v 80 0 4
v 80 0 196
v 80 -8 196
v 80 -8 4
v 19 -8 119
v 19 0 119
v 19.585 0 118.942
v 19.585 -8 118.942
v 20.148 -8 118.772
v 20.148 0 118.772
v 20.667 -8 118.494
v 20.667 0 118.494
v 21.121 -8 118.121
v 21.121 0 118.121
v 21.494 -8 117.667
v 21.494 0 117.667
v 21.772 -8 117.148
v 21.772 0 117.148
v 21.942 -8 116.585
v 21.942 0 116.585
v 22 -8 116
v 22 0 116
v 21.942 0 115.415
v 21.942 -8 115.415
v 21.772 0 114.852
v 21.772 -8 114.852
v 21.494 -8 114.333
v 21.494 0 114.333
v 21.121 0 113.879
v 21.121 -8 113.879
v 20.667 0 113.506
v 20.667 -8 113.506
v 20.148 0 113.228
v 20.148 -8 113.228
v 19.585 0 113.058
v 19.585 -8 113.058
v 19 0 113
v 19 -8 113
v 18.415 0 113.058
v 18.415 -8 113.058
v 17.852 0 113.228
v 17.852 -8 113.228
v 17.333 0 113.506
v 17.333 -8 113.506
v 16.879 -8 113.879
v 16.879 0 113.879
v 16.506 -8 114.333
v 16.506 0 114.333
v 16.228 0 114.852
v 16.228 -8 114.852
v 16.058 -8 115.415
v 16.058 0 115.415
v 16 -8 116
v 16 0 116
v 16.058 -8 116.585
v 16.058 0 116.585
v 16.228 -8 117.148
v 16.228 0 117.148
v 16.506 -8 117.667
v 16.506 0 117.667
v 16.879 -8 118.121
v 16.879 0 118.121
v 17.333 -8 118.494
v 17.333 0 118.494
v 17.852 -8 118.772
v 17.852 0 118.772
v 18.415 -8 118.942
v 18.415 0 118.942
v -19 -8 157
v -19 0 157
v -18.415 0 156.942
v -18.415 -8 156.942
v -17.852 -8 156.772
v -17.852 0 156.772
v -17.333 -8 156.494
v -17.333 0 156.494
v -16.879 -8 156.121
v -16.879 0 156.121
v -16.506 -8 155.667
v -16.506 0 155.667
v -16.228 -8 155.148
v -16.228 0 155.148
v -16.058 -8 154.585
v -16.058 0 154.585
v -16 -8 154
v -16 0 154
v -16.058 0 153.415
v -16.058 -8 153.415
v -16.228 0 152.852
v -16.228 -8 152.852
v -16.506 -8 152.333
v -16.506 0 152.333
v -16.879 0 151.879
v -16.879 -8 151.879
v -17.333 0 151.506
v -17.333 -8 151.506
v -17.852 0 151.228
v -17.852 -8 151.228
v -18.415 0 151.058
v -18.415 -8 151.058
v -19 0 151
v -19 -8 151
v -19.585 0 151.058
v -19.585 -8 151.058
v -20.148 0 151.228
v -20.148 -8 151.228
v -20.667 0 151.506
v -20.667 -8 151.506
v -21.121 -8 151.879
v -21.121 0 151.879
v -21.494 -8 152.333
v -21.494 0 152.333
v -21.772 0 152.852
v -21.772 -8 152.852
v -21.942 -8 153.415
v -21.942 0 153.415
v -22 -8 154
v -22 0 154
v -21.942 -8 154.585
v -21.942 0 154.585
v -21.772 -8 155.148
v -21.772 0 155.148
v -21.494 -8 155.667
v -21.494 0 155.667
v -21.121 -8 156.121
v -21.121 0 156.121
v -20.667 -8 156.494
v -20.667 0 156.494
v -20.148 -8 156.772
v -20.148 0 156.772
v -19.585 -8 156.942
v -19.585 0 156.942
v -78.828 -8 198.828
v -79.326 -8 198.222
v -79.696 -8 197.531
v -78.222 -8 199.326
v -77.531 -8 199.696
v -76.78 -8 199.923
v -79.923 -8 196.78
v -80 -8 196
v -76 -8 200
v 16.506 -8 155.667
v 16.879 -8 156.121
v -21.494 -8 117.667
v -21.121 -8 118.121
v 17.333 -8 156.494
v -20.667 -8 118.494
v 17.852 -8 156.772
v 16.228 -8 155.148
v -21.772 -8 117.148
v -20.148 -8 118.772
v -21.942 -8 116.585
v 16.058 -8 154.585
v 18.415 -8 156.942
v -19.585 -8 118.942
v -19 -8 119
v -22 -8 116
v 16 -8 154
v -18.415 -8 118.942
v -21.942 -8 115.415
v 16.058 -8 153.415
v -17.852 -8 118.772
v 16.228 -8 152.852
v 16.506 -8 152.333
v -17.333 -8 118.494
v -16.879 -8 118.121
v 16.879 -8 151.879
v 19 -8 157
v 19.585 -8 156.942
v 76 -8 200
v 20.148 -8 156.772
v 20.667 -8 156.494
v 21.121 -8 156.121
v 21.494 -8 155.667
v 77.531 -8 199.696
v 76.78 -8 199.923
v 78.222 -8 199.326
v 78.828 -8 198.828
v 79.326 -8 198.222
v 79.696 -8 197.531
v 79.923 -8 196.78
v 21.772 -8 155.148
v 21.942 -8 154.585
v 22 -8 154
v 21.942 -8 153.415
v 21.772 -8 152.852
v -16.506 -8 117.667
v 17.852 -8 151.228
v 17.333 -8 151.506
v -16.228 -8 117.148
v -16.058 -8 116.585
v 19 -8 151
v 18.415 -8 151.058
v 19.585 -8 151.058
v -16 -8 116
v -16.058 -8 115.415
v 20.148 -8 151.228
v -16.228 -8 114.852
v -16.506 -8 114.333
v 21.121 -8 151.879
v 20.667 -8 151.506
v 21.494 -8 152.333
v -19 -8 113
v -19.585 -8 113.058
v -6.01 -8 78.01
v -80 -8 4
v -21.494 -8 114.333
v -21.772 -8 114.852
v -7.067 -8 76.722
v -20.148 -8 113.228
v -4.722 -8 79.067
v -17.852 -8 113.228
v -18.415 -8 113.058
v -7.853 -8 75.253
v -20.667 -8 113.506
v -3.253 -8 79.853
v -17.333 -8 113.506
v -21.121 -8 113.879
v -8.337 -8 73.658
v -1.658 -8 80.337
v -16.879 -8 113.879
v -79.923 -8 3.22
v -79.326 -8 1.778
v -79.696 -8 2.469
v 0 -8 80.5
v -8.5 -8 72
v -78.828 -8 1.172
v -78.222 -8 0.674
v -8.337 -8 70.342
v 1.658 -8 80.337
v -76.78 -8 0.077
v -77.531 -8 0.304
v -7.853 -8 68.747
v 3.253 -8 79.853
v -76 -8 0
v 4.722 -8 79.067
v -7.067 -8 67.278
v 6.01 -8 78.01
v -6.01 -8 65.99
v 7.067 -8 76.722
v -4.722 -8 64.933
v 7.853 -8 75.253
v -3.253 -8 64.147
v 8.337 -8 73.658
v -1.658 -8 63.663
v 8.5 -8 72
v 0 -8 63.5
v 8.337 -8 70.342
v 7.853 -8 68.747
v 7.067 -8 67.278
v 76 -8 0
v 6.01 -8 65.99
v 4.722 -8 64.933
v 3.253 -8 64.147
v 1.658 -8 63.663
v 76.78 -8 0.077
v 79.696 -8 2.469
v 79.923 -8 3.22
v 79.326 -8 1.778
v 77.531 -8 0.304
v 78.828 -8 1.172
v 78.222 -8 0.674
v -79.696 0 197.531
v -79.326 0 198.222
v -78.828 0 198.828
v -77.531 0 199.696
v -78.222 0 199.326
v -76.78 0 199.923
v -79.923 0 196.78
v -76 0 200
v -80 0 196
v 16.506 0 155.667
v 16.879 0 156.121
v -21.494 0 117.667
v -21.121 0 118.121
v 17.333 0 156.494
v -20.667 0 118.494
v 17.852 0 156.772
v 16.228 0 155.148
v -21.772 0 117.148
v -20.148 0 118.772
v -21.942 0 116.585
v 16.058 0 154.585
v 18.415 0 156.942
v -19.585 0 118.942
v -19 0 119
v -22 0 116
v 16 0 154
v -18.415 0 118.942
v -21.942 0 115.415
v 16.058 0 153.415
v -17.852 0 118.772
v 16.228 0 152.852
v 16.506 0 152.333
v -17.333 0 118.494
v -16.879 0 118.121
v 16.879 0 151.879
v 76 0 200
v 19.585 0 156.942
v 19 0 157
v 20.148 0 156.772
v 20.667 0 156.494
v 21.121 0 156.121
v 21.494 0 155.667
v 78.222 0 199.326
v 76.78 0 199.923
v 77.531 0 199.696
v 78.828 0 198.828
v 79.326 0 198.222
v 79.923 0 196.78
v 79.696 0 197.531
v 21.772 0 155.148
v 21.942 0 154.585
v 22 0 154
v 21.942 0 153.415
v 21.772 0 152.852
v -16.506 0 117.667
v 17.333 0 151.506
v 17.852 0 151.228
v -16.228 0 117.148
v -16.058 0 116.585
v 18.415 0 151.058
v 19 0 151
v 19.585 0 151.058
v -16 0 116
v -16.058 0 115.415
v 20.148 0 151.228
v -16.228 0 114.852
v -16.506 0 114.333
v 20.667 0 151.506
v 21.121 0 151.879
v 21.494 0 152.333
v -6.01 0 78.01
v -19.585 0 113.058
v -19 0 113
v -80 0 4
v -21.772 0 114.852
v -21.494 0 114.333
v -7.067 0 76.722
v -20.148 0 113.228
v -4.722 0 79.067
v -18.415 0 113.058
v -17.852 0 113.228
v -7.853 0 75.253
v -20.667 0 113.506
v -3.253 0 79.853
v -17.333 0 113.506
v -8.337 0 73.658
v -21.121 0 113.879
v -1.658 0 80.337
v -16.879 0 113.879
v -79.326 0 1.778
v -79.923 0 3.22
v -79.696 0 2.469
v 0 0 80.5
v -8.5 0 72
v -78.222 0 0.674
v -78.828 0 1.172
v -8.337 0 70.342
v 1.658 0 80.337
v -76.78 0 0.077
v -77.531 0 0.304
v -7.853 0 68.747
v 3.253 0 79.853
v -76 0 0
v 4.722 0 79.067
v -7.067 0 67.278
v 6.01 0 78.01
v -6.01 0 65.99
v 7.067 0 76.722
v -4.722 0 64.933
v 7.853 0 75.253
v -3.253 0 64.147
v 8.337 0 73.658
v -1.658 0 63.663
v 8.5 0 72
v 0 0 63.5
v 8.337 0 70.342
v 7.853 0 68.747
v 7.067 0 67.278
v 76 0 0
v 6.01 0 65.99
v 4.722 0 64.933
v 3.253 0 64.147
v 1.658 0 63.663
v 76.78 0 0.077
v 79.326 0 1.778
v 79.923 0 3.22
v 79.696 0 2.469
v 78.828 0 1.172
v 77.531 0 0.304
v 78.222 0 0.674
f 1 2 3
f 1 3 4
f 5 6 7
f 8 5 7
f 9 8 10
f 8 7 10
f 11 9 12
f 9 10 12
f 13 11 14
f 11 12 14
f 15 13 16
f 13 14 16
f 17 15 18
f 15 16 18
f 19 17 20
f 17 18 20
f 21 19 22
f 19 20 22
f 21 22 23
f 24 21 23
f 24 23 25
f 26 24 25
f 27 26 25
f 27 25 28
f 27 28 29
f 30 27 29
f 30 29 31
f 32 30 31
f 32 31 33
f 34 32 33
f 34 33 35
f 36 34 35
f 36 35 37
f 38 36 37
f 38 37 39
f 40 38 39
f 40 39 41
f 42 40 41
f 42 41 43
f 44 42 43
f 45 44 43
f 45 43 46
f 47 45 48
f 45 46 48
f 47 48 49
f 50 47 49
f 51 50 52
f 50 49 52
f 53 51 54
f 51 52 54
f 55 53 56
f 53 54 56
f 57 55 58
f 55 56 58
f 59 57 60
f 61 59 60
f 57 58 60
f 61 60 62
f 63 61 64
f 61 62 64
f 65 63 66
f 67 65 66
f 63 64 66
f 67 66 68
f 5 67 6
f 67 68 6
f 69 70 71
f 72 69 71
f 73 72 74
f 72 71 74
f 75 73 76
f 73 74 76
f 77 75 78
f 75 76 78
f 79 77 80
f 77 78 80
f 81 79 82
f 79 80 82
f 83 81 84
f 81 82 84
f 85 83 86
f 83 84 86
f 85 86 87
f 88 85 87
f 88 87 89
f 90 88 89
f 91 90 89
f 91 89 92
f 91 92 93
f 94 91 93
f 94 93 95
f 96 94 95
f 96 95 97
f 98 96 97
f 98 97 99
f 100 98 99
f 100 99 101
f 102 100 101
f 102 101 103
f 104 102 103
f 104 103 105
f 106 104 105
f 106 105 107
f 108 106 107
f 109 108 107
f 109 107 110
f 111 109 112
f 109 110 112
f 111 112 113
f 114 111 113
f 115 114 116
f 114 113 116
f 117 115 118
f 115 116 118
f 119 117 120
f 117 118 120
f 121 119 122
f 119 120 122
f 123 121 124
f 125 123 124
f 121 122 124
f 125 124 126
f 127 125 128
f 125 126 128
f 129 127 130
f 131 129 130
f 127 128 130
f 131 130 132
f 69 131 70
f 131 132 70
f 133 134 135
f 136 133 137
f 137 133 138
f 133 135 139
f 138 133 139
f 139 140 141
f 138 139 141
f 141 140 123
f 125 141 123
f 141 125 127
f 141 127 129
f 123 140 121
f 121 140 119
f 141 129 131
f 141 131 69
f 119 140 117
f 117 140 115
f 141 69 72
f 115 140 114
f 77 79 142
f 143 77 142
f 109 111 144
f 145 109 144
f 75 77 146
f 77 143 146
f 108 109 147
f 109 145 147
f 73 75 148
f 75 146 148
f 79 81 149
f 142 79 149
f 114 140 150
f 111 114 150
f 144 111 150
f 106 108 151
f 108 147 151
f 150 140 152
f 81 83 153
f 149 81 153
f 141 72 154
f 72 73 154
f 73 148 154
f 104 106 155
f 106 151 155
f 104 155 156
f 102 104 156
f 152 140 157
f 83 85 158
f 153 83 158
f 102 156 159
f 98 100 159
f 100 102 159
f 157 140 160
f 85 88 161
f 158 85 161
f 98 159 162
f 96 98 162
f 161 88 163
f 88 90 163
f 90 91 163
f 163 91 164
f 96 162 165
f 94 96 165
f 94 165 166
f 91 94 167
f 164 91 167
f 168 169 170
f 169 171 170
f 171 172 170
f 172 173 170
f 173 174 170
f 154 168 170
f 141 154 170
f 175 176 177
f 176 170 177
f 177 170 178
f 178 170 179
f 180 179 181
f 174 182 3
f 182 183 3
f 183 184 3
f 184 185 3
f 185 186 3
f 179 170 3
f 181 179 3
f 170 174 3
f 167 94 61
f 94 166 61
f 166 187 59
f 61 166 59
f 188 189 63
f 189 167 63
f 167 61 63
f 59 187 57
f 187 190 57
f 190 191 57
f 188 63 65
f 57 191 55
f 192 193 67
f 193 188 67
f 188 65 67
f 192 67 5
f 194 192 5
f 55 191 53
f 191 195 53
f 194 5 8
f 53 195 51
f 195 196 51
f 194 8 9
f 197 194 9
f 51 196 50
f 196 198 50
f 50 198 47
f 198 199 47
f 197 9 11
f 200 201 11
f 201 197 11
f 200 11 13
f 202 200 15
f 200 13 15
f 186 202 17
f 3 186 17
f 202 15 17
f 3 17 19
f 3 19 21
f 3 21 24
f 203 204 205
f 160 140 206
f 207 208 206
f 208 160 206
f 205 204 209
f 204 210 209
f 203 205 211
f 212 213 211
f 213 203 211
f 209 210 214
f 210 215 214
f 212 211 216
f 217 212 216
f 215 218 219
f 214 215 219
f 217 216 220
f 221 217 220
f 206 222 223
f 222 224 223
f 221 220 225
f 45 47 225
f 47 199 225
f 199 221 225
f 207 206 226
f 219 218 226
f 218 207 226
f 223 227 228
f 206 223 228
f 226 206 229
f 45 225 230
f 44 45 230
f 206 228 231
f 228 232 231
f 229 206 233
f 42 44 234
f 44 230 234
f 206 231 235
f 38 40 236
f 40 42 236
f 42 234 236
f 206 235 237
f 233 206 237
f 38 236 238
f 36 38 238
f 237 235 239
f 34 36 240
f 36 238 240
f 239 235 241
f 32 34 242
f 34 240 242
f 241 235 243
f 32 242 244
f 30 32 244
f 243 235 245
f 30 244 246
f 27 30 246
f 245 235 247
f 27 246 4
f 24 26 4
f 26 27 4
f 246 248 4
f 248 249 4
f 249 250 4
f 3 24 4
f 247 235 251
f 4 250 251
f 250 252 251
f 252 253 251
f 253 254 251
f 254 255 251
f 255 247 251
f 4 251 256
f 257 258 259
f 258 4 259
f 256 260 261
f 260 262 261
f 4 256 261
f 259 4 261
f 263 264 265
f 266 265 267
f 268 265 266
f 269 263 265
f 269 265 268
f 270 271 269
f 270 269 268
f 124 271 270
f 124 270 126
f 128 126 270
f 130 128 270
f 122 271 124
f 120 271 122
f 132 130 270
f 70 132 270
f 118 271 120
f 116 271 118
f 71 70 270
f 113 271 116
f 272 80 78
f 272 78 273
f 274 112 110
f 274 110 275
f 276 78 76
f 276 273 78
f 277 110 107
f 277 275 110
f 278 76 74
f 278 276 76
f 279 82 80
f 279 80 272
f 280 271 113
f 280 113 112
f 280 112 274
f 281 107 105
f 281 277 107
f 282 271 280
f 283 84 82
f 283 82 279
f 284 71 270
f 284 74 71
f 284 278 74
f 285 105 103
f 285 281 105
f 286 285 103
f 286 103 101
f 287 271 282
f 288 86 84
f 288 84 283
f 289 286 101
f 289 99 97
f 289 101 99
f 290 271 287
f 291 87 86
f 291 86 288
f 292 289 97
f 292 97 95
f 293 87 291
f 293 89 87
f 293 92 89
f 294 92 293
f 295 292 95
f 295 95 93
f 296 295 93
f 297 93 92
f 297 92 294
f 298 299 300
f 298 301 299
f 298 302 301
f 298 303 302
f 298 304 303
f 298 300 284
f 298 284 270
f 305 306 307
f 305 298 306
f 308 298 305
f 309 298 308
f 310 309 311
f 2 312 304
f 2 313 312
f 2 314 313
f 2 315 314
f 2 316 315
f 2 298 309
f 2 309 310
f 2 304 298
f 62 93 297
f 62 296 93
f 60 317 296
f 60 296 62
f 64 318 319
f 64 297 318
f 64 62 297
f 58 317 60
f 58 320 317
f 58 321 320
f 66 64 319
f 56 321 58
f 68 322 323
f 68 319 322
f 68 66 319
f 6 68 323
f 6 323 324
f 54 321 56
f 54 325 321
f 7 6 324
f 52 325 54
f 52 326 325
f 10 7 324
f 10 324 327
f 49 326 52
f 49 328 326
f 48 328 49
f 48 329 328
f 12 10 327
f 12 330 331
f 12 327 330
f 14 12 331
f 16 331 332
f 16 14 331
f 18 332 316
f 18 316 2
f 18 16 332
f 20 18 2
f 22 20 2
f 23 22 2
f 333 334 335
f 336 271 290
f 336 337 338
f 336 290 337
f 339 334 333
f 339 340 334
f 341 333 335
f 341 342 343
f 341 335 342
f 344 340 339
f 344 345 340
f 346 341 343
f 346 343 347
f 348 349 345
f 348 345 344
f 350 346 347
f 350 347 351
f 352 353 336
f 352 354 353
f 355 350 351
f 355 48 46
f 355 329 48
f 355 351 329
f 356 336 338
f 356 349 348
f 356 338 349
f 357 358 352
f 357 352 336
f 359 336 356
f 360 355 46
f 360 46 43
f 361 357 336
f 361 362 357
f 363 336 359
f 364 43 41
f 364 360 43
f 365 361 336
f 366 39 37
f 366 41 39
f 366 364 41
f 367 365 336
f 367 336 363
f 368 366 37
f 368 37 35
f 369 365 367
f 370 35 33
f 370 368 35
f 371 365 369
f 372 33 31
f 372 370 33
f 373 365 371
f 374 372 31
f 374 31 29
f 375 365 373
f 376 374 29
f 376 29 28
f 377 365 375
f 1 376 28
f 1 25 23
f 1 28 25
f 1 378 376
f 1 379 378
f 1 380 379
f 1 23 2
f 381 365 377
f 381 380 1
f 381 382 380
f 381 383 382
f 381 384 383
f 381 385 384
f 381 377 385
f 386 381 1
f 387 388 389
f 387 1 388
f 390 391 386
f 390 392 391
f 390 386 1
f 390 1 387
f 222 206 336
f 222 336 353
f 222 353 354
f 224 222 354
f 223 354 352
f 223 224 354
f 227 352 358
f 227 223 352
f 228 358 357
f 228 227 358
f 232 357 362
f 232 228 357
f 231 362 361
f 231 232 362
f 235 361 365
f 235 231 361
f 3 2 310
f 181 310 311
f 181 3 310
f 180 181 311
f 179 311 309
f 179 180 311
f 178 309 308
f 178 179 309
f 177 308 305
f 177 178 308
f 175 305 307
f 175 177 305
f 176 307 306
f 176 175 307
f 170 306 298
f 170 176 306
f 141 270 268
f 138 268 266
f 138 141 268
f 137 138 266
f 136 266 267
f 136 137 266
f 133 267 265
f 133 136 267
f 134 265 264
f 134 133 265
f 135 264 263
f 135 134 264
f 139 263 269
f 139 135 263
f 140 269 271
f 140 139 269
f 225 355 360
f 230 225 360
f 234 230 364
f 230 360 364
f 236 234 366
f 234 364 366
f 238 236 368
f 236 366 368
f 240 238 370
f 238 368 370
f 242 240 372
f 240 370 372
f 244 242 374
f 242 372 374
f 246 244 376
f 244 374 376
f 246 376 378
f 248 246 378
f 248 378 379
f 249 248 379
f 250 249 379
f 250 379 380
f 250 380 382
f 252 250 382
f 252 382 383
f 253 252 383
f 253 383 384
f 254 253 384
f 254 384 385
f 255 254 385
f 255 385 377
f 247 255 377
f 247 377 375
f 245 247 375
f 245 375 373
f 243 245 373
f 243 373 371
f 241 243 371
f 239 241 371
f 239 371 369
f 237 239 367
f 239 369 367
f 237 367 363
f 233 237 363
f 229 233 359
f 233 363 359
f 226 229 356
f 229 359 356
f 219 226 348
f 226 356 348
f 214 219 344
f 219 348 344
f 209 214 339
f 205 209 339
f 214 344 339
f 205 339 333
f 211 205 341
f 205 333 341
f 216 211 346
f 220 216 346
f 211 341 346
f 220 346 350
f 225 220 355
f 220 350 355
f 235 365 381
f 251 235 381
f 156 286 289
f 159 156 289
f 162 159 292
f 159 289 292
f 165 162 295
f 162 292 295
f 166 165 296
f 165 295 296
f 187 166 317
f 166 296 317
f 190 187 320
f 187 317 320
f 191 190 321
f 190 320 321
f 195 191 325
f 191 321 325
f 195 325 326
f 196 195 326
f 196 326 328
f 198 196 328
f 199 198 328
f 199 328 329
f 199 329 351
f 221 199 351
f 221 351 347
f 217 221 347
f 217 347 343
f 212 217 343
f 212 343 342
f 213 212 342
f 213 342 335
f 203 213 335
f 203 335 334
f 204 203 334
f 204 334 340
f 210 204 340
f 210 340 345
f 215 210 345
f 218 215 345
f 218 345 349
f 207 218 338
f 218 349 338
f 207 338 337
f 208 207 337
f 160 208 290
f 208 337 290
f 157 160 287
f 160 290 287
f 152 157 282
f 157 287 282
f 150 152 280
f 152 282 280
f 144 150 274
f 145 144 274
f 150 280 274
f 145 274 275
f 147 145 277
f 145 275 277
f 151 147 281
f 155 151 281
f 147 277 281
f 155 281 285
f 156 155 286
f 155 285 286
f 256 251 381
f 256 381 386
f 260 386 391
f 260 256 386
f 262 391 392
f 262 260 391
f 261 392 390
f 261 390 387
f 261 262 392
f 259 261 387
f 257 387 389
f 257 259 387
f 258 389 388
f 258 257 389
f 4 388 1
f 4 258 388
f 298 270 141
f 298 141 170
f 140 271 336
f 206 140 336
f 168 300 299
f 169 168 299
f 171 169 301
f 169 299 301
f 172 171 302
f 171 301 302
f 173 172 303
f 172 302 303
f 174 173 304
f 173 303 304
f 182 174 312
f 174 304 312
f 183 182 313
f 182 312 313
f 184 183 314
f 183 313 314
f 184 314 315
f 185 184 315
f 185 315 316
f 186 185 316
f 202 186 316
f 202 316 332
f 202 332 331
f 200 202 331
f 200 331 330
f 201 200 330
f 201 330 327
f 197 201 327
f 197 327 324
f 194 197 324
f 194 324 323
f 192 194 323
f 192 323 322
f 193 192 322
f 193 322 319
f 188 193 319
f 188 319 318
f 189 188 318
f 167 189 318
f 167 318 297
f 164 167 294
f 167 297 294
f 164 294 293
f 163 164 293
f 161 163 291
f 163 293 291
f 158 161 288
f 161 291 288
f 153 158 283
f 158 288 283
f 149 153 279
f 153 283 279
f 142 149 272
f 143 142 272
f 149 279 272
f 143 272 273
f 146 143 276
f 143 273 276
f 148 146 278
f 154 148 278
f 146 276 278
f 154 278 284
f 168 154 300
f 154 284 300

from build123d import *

# Parameters (mm, degrees)
IZIM2_W               = 160
IZIM2_H               = 200
TABAN_FLAN_1_DEPTH    = 8
K_ELERI_START         = -8
K_ELERI_K_R1_DEPTH    = 8
IZIM3_R               = 8.5
KES_EKSTR_ZYON1_DEPTH = 216.555097365
IZIM4_R               = 3
KES_EKSTR_ZYON2_DEPTH = 216.555097365


# Read off the part's stored shape, not the designer's step: Köşeleri kır1
# Sheet-metal steps are written as plain solids
with BuildPart() as part:
    # Çizim2 → Taban-Flanş1 (new body)
    with BuildSketch(Plane(origin=(0, 0, 0), x_dir=(1, 0, 0), z_dir=(0, 1, 0))):
        with Locations((0, -100)):
            Rectangle(IZIM2_W, IZIM2_H)
    extrude(amount=-TABAN_FLAN_1_DEPTH)

    # Köşeleri kır1 outline → Köşeleri kır1 (cut)
    with BuildSketch(Plane(origin=(0, 0, 0), x_dir=(1, 0, 0), z_dir=(0, 1, 0)).offset(K_ELERI_START)):
        with BuildLine():
            ThreePointArc((80, -196), (78.828427125, -198.828427125), (76, -200))
            Line((76, -200), (80, -200))
            Line((80, -200), (80, -196))
        make_face()
        with BuildLine():
            Line((-80, -200), (-76, -200))
            ThreePointArc((-76, -200), (-78.828427125, -198.828427125), (-80, -196))
            Line((-80, -196), (-80, -200))
        make_face()
        with BuildLine():
            ThreePointArc((76, 0), (78.828427125, -1.171572875), (80, -4))
            Line((80, -4), (80, 0))
            Line((80, 0), (76, 0))
        make_face()
        with BuildLine():
            Line((-80, 0), (-80, -4))
            ThreePointArc((-80, -4), (-78.828427125, -1.171572875), (-76, 0))
            Line((-76, 0), (-80, 0))
        make_face()
    extrude(amount=K_ELERI_K_R1_DEPTH, mode=Mode.SUBTRACT)

    # Çizim3 → Kes-Ekstrüzyon1 (cut, through all)
    with BuildSketch(Plane(origin=(0, 0, 0), x_dir=(1, 0, 0), z_dir=(0, 1, 0))):
        with Locations(Location((0, -72, 0), (0, 0, 270))):
            Circle(IZIM3_R)
    extrude(amount=-KES_EKSTR_ZYON1_DEPTH, mode=Mode.SUBTRACT)

    # Çizim4 → Kes-Ekstrüzyon2 (cut, through all)
    with BuildSketch(Plane(origin=(0, 0, 0), x_dir=(1, 0, 0), z_dir=(0, 1, 0))):
        with Locations(Location((-19, -116, 0), (0, 0, 270))):
            Circle(IZIM4_R)
        with Locations(Location((19, -116, 0), (0, 0, 270))):
            Circle(IZIM4_R)
        with Locations(Location((19, -154, 0), (0, 0, 270))):
            Circle(IZIM4_R)
        with Locations(Location((-19, -154, 0), (0, 0, 270))):
            Circle(IZIM4_R)
    extrude(amount=-KES_EKSTR_ZYON2_DEPTH, mode=Mode.SUBTRACT)


solid = part.part
